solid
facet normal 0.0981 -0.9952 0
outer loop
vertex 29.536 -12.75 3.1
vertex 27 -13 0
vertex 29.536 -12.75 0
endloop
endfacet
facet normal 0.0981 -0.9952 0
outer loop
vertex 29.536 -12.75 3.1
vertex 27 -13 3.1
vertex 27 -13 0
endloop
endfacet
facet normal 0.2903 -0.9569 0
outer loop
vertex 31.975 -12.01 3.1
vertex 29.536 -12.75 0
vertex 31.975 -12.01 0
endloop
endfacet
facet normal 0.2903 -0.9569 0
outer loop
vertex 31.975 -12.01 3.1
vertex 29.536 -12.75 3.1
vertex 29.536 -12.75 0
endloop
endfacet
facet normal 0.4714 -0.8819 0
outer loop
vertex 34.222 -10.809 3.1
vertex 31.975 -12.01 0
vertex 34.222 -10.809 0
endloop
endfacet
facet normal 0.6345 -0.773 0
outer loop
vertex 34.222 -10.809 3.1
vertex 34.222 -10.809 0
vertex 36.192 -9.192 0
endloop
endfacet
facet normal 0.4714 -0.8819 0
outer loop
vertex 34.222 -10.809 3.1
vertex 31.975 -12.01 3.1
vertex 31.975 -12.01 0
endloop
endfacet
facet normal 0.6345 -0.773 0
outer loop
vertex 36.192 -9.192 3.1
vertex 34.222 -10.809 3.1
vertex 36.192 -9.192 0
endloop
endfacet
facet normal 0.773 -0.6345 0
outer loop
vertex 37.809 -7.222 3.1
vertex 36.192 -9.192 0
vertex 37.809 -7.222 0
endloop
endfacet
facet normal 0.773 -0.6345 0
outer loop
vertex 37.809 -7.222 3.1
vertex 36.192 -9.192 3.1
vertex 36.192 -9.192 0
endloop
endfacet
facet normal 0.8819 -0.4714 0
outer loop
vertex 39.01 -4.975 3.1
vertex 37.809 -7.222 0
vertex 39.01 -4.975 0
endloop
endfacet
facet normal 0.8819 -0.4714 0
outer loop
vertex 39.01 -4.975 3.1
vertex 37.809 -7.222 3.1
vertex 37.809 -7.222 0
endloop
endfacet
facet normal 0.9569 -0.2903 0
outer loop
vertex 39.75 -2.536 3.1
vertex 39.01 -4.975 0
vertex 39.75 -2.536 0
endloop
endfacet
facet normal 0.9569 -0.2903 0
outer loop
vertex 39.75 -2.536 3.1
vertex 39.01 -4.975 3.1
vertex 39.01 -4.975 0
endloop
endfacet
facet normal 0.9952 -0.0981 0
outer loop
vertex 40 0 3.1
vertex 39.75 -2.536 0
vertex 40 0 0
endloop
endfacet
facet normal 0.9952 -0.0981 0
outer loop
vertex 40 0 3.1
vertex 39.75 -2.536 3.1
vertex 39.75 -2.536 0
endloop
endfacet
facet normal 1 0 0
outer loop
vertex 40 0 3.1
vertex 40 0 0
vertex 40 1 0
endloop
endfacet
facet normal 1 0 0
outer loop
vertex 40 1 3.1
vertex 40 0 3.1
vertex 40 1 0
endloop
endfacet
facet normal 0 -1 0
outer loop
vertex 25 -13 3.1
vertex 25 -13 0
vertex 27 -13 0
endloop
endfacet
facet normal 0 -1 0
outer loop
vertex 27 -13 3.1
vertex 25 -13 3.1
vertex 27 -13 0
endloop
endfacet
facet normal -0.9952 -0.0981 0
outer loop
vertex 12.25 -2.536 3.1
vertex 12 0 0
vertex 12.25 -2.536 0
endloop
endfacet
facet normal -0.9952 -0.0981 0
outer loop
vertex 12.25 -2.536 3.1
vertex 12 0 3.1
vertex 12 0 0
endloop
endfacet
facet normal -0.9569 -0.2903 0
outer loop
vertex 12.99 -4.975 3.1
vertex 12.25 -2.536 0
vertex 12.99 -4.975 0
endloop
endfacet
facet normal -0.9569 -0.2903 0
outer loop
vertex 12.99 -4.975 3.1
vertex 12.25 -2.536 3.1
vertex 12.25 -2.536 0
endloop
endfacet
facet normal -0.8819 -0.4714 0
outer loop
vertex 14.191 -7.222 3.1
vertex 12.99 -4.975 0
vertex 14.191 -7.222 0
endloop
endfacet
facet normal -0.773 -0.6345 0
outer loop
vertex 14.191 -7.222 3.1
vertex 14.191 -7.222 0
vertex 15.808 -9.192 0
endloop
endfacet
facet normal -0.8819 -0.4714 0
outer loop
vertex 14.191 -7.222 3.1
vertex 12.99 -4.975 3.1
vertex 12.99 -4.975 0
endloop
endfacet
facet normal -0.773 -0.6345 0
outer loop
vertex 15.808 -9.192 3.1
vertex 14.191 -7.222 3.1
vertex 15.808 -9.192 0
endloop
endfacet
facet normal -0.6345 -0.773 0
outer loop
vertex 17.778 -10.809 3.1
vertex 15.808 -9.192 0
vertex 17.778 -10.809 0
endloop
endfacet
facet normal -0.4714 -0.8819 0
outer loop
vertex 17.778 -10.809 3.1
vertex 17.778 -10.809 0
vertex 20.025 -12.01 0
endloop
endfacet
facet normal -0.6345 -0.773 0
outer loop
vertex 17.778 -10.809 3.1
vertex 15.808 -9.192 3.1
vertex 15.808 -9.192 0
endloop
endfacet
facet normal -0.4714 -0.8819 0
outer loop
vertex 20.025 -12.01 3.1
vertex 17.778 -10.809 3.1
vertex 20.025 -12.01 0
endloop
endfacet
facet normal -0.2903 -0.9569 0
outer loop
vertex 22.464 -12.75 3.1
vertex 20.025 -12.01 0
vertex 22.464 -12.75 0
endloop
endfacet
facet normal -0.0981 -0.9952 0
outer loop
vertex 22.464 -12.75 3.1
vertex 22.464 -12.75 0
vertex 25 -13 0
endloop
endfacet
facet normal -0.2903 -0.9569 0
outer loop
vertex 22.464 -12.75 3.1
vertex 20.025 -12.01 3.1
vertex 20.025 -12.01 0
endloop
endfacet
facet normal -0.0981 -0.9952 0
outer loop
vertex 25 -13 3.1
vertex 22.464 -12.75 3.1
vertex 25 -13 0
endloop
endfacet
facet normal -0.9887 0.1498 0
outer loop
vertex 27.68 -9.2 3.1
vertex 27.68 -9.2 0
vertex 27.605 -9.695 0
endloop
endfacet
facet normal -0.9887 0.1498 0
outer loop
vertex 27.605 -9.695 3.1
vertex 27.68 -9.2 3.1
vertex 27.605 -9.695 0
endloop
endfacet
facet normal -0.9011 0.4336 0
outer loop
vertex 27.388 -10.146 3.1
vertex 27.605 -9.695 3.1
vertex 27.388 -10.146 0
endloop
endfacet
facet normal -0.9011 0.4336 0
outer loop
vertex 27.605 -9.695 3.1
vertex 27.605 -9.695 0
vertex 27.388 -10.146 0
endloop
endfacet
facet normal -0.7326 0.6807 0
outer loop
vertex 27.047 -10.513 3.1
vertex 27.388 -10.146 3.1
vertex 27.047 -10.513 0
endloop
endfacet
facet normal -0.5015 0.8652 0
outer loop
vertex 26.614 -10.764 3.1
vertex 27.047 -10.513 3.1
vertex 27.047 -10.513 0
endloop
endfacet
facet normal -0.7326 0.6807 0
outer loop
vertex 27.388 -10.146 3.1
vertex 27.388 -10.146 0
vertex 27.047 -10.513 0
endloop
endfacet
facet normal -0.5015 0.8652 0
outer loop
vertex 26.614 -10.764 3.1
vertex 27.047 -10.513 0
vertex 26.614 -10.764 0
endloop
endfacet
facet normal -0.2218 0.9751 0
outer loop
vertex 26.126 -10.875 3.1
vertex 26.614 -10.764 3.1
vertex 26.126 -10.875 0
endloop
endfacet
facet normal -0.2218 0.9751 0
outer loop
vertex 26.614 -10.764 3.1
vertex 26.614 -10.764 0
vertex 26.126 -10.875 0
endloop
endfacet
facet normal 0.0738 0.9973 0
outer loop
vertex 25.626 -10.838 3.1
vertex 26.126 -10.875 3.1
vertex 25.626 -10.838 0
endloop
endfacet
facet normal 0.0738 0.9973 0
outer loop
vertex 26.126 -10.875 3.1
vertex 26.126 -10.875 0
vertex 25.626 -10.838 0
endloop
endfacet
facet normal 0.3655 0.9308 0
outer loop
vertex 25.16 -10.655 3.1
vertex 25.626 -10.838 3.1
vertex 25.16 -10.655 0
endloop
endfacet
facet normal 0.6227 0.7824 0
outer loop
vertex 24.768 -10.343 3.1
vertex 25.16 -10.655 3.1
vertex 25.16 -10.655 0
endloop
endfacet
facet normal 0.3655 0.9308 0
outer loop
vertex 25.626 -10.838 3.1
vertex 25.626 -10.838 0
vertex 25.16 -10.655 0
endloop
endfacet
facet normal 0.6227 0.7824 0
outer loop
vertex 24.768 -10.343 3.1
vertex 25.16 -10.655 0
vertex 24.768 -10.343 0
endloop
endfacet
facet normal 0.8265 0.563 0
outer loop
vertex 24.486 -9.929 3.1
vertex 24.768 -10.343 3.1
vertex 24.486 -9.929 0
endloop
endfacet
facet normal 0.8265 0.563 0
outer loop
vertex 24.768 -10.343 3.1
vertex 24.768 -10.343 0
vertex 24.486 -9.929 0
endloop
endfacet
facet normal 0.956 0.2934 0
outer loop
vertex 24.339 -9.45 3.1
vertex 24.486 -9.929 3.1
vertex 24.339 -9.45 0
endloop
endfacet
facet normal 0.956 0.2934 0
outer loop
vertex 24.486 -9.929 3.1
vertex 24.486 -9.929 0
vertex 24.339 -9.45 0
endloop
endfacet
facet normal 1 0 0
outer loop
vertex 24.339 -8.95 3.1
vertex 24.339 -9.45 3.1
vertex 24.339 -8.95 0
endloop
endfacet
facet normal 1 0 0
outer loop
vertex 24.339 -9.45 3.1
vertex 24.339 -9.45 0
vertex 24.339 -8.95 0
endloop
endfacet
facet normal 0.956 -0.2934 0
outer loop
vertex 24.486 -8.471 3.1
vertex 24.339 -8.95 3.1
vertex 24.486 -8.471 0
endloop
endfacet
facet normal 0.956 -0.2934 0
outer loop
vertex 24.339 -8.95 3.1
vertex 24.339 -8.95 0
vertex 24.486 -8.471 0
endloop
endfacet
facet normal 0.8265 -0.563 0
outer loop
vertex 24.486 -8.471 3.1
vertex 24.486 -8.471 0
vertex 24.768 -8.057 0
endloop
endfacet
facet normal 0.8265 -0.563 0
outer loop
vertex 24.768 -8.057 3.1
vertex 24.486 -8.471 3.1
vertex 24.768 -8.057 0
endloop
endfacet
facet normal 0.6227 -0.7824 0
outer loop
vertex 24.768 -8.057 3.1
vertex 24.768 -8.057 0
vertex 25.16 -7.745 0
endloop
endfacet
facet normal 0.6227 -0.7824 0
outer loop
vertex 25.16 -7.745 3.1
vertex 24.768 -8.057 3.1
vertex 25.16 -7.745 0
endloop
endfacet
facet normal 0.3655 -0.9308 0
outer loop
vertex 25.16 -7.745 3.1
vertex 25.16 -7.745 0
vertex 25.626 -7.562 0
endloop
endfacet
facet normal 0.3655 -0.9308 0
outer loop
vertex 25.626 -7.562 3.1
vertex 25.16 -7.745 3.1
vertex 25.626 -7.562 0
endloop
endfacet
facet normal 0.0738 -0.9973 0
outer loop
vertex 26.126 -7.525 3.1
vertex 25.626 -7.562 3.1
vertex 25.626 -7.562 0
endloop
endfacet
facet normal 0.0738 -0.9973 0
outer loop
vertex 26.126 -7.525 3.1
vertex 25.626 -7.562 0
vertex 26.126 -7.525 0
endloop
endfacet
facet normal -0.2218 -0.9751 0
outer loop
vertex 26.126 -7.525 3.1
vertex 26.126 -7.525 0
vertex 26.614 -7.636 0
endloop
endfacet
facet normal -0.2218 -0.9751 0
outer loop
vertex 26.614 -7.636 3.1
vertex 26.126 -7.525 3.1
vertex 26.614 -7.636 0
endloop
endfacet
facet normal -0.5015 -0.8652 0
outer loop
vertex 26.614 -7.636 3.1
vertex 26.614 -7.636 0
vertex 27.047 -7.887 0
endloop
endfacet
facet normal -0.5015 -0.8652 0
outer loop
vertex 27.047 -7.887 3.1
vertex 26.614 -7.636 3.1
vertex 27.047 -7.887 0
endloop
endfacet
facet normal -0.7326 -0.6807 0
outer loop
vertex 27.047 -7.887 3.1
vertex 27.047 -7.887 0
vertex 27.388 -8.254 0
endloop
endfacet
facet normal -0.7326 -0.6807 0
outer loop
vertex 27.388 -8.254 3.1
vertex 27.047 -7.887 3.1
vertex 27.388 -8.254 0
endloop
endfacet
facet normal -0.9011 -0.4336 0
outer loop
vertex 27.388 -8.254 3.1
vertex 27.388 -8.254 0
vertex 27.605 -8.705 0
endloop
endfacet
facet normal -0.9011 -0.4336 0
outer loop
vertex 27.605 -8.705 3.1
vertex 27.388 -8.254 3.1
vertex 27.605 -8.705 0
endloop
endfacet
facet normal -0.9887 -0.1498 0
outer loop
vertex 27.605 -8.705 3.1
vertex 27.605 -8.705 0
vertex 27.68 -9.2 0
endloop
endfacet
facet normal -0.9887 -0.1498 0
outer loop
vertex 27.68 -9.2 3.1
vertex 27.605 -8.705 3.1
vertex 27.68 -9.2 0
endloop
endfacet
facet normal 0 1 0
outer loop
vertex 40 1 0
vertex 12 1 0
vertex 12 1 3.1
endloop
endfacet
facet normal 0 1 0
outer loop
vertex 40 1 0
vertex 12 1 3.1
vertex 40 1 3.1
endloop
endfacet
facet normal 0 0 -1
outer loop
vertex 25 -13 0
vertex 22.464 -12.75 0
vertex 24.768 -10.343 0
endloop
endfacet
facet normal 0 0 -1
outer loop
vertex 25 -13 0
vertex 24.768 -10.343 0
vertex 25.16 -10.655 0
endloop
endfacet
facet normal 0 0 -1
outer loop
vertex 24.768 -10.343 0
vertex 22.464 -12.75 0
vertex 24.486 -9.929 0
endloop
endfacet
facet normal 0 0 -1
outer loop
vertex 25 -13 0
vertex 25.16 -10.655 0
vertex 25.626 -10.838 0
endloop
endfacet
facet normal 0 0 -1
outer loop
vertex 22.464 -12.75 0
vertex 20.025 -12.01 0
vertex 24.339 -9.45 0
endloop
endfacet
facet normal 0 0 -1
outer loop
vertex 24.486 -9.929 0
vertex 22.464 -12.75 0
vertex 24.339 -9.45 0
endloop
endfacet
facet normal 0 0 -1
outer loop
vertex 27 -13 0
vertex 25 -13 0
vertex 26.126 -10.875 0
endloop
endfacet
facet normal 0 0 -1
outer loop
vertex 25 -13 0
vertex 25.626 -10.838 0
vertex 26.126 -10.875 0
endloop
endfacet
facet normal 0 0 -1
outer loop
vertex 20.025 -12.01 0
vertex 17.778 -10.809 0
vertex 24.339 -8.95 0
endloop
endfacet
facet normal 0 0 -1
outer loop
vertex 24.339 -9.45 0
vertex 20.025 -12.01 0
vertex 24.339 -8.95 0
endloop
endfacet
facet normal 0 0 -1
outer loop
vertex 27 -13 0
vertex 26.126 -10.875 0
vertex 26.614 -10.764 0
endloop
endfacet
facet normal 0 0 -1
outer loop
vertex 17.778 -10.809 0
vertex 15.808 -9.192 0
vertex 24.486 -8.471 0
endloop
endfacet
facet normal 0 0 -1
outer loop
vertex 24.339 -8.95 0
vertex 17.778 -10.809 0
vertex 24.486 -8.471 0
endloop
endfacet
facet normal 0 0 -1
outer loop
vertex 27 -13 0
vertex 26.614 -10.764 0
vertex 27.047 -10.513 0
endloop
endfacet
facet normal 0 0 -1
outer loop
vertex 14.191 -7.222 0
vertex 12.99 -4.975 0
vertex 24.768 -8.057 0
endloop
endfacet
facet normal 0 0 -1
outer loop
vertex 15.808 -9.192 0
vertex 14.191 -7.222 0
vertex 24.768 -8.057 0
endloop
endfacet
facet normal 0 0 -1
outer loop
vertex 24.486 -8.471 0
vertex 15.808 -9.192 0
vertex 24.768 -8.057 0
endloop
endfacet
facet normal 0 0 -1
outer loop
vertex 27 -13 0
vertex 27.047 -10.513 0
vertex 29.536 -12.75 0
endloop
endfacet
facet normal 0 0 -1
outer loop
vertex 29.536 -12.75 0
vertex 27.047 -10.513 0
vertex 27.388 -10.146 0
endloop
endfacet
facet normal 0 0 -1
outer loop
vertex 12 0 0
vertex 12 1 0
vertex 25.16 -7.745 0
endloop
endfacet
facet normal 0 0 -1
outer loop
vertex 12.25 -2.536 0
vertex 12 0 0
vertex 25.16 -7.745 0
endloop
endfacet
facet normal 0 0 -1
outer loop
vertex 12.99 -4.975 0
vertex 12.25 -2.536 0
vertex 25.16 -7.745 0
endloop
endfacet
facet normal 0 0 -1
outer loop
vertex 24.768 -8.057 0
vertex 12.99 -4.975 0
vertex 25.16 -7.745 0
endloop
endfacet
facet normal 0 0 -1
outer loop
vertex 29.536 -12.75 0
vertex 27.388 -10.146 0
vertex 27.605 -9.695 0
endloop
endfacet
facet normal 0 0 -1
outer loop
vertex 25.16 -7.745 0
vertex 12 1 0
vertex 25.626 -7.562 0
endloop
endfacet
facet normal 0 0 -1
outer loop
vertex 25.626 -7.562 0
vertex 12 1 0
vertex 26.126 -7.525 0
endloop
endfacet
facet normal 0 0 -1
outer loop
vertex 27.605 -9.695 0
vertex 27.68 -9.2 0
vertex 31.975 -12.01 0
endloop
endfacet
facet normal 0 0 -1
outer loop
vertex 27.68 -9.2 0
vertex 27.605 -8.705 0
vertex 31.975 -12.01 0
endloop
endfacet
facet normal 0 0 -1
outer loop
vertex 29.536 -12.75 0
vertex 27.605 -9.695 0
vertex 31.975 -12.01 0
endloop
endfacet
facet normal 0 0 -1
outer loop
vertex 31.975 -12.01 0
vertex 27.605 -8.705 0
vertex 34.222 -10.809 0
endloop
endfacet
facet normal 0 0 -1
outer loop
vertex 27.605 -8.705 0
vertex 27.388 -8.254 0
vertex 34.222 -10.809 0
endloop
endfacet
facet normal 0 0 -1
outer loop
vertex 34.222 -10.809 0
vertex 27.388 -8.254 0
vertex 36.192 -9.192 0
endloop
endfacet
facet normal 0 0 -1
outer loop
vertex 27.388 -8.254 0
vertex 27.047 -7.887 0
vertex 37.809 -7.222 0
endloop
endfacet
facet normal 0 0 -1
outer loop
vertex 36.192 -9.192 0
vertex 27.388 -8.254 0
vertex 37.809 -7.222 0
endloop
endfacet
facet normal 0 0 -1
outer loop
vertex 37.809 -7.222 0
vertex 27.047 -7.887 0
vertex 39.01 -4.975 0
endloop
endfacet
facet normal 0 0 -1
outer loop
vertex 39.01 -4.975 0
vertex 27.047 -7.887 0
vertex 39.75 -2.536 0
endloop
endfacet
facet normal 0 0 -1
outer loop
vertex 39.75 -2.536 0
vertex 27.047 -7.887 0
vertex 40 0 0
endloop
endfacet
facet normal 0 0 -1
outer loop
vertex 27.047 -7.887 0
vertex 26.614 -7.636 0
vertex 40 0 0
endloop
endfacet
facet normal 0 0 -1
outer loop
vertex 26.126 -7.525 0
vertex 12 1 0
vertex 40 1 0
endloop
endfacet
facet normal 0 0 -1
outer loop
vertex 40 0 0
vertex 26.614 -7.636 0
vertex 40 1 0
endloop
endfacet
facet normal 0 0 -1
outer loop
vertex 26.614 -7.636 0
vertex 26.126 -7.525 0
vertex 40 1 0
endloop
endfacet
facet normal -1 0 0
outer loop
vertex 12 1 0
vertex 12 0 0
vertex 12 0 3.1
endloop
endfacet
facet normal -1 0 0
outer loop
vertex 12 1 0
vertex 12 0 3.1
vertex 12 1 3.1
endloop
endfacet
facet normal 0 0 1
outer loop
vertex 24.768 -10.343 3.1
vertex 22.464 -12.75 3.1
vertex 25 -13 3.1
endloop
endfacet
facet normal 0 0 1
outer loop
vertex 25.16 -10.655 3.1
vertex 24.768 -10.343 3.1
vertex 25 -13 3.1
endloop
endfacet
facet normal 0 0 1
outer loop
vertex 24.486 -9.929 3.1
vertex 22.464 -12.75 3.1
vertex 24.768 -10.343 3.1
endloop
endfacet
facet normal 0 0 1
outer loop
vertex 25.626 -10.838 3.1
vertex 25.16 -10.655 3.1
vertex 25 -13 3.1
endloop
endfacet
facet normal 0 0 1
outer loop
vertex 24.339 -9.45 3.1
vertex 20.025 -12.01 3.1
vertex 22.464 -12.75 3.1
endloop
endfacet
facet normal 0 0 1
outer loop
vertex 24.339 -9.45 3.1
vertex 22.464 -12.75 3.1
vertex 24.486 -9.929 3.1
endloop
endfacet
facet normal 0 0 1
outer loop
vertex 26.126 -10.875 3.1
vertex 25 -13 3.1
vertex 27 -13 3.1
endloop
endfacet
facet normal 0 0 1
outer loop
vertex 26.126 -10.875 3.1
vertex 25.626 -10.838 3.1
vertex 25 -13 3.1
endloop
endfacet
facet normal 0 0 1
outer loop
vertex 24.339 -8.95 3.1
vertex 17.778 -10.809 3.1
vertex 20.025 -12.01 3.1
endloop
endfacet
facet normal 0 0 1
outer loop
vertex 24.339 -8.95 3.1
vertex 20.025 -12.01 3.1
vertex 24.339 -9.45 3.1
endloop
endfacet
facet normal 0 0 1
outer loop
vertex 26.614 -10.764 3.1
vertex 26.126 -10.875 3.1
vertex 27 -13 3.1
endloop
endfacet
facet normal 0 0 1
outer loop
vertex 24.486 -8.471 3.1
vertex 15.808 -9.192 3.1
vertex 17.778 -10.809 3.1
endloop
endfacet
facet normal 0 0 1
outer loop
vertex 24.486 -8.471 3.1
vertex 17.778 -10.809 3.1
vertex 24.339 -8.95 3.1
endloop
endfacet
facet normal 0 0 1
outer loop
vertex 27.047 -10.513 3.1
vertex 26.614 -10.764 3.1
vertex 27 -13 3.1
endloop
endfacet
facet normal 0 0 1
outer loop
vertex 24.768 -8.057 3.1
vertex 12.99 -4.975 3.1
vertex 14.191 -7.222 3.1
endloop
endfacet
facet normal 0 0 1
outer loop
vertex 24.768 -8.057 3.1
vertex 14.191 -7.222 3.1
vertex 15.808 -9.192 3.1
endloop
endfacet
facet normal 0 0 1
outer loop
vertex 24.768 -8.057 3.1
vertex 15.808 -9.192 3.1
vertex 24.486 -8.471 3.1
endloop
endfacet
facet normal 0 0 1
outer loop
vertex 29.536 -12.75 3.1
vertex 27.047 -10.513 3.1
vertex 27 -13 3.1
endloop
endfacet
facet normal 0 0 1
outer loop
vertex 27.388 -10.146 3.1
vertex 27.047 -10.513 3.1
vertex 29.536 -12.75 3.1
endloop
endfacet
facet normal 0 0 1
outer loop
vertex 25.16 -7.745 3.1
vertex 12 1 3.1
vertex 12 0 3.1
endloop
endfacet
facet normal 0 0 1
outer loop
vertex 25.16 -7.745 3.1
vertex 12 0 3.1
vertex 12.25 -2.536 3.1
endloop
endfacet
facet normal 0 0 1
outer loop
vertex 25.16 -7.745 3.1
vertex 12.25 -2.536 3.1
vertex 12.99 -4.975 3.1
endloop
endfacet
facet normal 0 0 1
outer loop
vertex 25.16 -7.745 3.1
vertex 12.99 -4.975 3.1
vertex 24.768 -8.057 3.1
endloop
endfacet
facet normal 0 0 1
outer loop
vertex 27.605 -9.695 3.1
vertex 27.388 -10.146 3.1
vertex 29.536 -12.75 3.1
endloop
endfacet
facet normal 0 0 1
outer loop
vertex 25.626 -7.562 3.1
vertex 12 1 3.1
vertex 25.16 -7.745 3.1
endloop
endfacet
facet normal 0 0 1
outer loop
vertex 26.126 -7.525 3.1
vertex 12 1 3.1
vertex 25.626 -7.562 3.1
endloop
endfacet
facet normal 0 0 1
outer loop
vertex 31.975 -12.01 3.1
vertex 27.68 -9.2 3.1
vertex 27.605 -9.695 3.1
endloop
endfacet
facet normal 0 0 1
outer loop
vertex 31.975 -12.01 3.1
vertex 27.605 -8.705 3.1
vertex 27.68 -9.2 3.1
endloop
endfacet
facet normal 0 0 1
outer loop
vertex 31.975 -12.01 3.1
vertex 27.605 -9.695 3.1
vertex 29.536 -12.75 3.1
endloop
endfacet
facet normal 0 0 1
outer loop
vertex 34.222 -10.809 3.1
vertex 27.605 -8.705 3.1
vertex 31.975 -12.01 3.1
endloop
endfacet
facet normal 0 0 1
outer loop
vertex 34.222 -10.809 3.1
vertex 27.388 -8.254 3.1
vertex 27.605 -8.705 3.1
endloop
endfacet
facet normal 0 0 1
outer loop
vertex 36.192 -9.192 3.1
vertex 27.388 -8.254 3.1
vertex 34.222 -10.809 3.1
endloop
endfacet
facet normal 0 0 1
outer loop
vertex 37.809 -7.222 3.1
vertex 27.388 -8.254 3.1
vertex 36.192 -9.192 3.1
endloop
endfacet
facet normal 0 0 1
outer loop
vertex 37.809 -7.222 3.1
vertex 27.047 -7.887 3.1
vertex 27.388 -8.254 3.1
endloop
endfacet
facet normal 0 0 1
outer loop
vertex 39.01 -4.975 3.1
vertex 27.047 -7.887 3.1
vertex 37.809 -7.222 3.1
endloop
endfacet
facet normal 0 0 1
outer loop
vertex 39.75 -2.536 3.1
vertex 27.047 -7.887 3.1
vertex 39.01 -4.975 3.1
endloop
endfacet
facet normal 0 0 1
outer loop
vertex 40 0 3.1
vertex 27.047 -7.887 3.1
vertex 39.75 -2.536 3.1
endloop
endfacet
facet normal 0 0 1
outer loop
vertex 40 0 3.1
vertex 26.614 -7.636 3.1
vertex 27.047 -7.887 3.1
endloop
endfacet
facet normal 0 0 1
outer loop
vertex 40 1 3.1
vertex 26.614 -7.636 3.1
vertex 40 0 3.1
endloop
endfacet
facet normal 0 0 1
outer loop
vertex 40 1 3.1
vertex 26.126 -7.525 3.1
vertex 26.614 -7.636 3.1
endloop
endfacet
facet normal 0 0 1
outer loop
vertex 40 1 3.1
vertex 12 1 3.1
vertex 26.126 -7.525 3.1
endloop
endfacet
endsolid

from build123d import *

# Parameters (mm, degrees)
BOX002_W        = 28
BOX002_H        = 14
BOX002_DEPTH    = 3.1
SKETCH017_R     = 1.68
POCKET009_DEPTH = 5
FILLET003_R     = 13


with BuildPart() as part:
    # Box002 → Box002 (new body)
    with BuildSketch(Plane(origin=(12, -13, 0), x_dir=(1, 0, 0), z_dir=(0, 0, 1))):
        with Locations((14, 7)):
            Rectangle(BOX002_W, BOX002_H)
    extrude(amount=BOX002_DEPTH)

    # Sketch017 → Pocket009 (cut)
    with BuildSketch(Plane(origin=(12, -13, 0), x_dir=(1, 0, 0), z_dir=(0, 0, -1))):
        with Locations((14, -3.8)):
            Circle(SKETCH017_R)
    extrude(amount=-POCKET009_DEPTH, mode=Mode.SUBTRACT)

    # Fillet003
    fillet003_edges = [part.edges().sort_by_distance(p)[0] for p in [
        (40, -13, 1.55),
        (12, -13, 1.55),
    ]]
    fillet(fillet003_edges, radius=FILLET003_R)


solid = part.part
